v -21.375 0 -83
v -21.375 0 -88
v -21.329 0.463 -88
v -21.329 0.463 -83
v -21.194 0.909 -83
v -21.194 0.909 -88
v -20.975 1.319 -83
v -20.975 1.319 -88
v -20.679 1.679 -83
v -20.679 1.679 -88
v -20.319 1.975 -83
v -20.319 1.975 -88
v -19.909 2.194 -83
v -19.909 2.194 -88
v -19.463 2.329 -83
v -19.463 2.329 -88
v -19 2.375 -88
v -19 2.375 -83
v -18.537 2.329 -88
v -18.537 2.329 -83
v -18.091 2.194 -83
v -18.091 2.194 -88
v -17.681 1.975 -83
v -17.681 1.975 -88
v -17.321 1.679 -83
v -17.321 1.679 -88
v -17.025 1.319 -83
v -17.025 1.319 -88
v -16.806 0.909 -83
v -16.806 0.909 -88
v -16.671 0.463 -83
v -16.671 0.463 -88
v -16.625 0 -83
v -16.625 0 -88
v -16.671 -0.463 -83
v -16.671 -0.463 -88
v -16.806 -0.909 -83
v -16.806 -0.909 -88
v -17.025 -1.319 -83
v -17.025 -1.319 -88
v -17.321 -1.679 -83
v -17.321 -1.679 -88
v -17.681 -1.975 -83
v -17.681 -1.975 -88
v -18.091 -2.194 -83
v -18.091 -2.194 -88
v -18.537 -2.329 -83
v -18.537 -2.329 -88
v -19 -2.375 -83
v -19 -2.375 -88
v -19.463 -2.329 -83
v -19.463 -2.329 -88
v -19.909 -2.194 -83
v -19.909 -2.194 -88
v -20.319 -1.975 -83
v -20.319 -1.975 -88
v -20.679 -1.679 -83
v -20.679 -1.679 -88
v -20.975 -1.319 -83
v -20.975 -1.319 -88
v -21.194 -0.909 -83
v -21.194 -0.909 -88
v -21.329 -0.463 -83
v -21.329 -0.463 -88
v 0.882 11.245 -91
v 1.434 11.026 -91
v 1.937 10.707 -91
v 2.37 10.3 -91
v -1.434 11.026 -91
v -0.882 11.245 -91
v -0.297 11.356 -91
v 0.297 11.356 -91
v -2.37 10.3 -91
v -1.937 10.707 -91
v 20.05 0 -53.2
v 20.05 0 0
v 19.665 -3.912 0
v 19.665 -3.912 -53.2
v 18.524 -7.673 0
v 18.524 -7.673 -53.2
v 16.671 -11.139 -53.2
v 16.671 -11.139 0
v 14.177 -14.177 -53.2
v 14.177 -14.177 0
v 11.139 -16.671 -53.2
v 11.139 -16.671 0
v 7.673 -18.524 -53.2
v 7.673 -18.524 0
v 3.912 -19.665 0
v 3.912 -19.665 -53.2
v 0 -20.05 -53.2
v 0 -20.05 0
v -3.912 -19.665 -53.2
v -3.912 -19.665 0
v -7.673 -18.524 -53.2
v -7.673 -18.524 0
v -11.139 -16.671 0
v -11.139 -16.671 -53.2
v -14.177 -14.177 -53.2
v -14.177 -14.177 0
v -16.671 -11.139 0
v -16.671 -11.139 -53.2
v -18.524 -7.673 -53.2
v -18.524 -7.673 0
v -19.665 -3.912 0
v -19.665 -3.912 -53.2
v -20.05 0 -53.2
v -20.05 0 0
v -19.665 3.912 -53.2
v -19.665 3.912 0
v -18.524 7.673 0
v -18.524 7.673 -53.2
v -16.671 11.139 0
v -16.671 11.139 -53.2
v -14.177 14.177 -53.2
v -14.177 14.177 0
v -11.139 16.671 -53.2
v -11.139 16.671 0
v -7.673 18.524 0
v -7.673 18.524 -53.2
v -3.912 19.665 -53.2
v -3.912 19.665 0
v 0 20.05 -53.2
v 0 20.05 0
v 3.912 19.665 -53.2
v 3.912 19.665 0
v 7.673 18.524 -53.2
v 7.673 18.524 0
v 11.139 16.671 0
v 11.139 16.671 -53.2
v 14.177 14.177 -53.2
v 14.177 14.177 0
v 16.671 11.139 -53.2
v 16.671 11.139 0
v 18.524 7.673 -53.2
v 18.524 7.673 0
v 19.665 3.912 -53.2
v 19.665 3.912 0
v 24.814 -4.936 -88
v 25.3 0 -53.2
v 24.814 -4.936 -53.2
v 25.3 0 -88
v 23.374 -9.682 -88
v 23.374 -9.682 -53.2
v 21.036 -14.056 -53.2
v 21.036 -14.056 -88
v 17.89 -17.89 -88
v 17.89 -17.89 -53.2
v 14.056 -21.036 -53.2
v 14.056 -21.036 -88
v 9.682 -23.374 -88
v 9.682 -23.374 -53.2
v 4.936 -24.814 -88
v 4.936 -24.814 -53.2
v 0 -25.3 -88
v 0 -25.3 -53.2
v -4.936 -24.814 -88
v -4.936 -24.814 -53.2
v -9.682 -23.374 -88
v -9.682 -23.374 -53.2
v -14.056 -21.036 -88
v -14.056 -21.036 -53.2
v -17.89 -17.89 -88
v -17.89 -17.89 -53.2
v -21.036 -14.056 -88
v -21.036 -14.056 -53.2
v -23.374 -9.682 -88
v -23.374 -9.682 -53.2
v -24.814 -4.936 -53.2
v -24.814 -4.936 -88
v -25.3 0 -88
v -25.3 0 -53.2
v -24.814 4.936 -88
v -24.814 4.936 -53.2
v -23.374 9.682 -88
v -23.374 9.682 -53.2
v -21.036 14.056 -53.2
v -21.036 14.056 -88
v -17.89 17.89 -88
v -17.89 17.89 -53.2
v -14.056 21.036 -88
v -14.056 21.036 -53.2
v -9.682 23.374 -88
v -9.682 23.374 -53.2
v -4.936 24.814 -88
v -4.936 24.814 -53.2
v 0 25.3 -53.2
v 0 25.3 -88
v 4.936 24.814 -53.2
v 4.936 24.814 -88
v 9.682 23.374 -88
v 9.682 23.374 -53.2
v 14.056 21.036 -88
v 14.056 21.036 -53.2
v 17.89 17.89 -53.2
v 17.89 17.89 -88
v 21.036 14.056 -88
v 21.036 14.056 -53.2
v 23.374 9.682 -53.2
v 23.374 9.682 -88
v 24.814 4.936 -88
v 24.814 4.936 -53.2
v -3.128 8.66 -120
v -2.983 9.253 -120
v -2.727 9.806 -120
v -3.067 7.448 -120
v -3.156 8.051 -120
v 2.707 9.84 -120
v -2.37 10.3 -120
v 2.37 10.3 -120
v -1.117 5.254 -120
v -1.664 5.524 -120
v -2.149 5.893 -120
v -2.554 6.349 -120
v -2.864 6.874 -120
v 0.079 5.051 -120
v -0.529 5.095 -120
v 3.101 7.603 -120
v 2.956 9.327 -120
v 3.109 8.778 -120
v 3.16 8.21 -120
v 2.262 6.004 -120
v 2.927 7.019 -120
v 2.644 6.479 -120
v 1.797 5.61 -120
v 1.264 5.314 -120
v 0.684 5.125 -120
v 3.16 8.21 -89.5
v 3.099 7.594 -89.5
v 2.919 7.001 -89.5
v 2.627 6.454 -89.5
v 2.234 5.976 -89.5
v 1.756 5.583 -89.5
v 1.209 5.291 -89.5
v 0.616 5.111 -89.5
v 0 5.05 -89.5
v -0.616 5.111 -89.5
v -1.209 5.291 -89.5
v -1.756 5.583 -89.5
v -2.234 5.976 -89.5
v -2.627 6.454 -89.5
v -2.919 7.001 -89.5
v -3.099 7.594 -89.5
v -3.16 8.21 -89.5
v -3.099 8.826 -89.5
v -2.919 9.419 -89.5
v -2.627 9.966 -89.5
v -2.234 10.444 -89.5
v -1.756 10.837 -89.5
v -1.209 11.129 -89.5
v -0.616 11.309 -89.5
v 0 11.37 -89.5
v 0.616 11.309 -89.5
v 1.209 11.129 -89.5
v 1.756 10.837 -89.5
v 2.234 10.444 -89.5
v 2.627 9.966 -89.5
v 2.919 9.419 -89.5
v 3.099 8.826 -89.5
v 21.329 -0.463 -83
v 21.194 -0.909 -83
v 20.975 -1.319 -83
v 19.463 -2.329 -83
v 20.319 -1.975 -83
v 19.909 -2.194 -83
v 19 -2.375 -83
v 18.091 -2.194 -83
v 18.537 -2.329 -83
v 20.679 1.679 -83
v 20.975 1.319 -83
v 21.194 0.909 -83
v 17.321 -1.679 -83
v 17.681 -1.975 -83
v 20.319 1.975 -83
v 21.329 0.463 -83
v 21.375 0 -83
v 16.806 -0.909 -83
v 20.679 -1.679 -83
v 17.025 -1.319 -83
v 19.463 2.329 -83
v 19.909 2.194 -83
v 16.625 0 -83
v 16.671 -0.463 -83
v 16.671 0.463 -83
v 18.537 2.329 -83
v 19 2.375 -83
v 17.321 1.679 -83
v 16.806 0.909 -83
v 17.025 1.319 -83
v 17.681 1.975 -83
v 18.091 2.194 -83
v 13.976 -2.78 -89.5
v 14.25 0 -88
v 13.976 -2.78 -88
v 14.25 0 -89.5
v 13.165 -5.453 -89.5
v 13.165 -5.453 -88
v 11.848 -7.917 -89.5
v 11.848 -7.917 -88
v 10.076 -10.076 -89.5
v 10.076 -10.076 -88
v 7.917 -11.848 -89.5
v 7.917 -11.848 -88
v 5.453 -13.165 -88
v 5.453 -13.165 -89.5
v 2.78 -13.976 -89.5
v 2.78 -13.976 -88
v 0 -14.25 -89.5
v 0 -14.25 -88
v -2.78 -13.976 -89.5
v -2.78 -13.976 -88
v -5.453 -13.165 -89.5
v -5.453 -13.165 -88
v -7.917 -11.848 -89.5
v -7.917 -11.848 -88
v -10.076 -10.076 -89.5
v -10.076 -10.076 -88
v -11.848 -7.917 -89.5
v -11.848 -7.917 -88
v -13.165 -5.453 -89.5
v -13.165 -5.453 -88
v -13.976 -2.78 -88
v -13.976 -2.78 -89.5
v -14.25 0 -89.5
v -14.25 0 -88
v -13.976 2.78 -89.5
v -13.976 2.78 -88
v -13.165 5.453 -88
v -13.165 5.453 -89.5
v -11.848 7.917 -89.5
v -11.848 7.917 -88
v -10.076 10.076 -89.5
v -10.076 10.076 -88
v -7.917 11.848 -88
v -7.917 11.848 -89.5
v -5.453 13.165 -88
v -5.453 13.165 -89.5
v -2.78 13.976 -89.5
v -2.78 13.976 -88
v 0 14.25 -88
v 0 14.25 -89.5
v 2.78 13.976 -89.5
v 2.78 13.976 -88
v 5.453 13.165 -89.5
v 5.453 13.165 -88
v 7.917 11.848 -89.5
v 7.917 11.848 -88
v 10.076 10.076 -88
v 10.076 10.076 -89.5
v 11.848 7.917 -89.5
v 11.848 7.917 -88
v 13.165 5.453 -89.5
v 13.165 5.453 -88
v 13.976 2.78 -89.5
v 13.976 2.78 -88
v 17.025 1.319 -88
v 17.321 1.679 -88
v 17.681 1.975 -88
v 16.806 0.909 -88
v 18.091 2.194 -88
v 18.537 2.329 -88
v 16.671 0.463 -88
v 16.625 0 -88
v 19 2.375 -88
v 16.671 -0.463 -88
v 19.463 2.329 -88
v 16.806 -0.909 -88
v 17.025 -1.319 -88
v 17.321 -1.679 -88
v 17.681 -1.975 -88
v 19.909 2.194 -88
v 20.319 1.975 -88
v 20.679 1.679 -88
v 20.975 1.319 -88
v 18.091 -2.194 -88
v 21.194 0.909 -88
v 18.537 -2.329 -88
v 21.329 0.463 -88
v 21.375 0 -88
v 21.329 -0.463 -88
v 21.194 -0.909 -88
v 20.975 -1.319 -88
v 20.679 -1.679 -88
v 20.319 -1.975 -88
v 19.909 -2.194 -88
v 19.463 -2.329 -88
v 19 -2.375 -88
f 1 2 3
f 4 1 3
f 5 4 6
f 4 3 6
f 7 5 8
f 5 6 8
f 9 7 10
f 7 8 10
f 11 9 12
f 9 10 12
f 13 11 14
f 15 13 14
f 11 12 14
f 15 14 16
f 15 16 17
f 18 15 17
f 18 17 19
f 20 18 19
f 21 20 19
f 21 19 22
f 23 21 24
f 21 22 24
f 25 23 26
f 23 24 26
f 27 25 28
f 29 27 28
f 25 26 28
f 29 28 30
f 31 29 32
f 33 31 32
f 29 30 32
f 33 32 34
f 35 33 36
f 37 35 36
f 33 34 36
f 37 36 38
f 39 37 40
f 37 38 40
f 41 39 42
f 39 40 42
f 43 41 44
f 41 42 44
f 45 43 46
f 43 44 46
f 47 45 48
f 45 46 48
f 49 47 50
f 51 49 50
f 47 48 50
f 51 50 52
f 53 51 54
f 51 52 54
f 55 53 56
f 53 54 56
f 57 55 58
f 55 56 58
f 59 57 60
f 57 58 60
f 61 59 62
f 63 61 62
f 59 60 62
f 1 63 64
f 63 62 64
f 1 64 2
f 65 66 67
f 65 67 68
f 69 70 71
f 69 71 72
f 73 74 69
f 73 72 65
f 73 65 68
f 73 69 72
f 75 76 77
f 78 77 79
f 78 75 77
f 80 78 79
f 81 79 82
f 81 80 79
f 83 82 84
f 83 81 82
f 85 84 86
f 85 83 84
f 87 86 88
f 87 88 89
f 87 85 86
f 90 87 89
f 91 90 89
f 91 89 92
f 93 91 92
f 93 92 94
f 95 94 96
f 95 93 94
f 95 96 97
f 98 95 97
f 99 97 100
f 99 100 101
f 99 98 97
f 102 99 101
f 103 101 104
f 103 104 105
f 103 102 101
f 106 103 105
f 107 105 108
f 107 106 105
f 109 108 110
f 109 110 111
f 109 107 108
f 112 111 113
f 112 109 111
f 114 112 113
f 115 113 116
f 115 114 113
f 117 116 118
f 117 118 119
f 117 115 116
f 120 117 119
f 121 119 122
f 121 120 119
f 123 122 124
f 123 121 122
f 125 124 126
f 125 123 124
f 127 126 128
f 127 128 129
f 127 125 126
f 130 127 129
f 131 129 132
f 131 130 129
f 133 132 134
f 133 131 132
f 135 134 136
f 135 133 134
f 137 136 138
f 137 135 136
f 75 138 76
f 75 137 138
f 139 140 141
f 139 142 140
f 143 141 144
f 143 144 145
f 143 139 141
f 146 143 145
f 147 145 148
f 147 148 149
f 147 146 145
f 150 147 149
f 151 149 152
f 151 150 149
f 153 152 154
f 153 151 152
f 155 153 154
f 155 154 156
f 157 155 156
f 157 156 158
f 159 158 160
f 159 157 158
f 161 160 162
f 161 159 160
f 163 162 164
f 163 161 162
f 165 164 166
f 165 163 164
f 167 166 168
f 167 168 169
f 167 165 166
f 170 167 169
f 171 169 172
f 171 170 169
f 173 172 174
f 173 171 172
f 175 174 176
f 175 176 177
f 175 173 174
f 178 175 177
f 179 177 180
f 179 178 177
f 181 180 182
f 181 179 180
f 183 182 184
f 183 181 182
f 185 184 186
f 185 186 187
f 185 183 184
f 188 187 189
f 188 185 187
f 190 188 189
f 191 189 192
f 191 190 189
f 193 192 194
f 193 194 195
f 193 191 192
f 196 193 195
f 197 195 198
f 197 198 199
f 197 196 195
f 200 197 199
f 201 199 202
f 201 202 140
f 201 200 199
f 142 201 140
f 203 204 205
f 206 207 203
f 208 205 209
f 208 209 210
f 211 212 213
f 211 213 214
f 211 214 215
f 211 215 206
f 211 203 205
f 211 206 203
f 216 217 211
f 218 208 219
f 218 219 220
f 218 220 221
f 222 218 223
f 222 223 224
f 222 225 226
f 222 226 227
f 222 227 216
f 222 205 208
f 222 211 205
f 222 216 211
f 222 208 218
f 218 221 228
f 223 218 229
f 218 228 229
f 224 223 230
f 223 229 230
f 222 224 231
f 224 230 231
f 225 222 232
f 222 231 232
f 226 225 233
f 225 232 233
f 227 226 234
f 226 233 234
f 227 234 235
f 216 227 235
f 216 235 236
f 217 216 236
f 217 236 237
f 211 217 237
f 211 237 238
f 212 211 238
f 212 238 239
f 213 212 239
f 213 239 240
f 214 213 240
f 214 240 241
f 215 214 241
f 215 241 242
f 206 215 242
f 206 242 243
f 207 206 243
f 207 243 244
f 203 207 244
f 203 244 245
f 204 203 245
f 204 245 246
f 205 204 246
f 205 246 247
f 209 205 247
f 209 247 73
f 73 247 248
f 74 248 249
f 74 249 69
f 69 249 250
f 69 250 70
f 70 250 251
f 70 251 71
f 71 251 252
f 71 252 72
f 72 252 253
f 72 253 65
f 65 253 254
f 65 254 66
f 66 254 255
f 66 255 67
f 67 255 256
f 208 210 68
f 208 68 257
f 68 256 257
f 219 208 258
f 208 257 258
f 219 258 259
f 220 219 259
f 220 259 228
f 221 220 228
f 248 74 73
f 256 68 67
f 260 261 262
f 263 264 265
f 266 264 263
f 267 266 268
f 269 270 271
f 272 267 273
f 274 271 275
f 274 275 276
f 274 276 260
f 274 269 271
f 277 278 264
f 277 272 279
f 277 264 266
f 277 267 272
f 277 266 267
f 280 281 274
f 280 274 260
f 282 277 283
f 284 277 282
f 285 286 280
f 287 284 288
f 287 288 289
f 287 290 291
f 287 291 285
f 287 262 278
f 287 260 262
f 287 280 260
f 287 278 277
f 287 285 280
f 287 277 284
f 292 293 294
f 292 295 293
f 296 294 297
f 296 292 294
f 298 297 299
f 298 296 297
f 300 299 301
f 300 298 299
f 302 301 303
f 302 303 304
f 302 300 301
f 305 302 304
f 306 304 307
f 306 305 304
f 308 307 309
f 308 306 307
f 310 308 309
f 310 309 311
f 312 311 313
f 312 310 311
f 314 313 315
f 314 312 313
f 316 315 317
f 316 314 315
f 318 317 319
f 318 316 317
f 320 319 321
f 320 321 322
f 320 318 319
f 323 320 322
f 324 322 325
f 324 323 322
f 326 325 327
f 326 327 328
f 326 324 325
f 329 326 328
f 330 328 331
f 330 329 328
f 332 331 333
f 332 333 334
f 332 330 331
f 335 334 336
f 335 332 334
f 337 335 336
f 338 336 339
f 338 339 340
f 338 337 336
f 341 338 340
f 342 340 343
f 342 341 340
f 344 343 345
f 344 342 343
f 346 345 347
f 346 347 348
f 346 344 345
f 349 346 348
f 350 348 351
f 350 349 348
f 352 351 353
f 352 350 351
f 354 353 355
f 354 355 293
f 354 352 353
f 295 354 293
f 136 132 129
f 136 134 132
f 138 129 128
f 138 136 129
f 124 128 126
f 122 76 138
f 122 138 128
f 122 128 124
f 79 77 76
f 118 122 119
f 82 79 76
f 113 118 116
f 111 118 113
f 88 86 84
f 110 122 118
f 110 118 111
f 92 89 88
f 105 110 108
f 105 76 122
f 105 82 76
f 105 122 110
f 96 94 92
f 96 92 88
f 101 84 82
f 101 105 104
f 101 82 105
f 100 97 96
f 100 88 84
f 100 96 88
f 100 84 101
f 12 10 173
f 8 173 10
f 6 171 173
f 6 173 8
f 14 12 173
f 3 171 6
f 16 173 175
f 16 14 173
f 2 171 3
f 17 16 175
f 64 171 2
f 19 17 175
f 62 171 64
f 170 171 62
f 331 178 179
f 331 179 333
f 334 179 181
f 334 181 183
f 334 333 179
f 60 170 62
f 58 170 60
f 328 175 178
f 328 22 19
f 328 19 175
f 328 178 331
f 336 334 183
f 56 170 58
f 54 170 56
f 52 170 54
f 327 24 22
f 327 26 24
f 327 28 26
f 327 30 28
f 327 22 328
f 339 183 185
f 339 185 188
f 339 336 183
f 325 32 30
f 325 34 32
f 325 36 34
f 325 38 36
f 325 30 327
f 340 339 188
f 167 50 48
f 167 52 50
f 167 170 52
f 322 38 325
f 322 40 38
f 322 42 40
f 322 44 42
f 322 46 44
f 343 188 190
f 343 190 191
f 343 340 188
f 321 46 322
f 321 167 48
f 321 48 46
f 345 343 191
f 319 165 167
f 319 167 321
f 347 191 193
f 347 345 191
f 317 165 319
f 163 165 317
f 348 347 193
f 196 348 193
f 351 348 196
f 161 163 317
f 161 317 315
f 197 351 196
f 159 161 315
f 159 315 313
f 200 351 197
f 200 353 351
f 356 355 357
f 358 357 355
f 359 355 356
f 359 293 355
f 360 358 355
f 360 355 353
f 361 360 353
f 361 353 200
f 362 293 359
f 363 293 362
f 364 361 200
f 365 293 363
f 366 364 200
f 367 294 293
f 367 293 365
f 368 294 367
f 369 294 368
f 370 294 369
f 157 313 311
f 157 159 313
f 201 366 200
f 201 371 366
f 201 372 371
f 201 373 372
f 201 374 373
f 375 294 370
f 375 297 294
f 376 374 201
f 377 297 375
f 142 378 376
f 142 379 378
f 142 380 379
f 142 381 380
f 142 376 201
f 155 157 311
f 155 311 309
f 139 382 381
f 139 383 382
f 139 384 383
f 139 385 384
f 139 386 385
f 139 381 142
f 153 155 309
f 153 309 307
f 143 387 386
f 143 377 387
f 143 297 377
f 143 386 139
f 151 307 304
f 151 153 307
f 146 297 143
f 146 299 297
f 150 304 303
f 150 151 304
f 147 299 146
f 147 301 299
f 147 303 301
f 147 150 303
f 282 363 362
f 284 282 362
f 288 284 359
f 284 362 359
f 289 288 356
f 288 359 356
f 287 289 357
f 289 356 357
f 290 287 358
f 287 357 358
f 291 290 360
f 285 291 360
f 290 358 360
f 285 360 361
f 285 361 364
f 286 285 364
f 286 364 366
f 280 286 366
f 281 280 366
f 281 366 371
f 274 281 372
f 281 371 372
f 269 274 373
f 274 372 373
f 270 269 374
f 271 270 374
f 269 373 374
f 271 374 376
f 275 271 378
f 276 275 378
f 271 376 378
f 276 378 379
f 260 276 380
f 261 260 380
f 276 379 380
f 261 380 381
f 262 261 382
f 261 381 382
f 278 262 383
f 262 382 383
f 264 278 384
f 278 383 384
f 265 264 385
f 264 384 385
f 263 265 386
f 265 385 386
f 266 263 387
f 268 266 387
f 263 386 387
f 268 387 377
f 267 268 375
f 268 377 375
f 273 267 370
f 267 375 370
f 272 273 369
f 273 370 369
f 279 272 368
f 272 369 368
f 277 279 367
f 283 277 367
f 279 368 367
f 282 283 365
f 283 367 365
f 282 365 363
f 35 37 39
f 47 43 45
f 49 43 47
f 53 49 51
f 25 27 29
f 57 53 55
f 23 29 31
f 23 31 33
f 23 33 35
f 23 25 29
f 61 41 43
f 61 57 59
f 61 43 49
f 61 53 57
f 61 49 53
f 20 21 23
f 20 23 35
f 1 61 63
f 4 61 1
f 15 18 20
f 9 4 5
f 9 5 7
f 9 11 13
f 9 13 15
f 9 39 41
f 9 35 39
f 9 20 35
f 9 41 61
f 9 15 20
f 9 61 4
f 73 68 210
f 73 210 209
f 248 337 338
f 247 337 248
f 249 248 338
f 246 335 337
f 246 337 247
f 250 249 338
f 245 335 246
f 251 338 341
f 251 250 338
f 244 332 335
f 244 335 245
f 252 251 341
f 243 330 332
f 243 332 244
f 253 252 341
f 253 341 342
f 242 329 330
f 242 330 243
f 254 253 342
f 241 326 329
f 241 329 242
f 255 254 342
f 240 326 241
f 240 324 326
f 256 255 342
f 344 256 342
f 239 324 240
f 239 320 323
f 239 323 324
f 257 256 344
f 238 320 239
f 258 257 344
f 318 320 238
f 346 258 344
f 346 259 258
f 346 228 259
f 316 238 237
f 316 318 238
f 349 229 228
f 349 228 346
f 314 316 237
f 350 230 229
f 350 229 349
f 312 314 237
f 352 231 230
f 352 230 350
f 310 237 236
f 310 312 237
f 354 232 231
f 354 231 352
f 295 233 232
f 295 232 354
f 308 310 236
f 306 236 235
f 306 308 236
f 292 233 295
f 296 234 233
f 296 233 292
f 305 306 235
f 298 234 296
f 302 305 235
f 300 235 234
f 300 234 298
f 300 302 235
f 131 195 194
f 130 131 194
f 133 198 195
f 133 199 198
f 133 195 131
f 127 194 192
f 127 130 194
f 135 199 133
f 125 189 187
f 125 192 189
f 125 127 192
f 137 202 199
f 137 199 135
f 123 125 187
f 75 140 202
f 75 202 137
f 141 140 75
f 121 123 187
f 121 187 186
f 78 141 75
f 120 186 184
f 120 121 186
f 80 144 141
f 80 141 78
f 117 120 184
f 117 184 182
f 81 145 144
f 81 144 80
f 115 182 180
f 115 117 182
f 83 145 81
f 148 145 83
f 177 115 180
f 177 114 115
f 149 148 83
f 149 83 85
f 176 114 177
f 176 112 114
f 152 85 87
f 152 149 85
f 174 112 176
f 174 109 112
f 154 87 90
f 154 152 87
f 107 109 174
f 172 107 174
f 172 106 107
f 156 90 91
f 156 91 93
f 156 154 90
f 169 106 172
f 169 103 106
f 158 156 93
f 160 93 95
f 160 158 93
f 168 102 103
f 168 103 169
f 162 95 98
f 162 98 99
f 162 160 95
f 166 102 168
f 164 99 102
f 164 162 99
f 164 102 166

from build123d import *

# Parameters (mm, degrees)
SKETCH4_R           = 3.16
BOSS_EXTRUDE1_DEPTH = 30.5
CUT_EXTRUDE2_START  = -29
CUT_EXTRUDE2_DEPTH  = 29
SKETCH6_R           = 2.375
CUT_EXTRUDE3_DEPTH  = 5


with BuildPart() as part:
    # Sketch1 → Revolve1 (revolve)
    with BuildSketch(Plane(origin=(0, 0, 0), x_dir=(1, 0, 0), z_dir=(0, 1, 0))):
        Polygon((0, 0), (20.05, 0), (20.05, 53.2), (25.3, 53.2), (25.3, 88), (14.25, 88), (14.25, 89.5), (0, 89.5), align=None)
    revolve(axis=Axis((0, 0, 0), (0, 0, -1)))

    # Sketch4 → Boss-Extrude1 (add)
    with BuildSketch(Plane(origin=(0, 0, -89.5), x_dir=(-1, 0, 0), z_dir=(0, 0, -1))):
        with Locations(Location((0, 8.21, 0), (0, 0, 180))):
            Circle(SKETCH4_R)
    extrude(amount=BOSS_EXTRUDE1_DEPTH)

    # Sketch5 → Cut-Extrude2 (cut)
    with BuildSketch(Plane(origin=(0, 0, -120), x_dir=(-1, 0, 0), z_dir=(0, 0, -1)).offset(CUT_EXTRUDE2_START)):
        with BuildLine():
            Line((-2.370126579, 10.3), (2.370126579, 10.3))
            ThreePointArc((2.370126579, 10.3), (0, 11.37), (-2.370126579, 10.3))
        make_face()
    extrude(amount=CUT_EXTRUDE2_DEPTH, mode=Mode.SUBTRACT)

    # Sketch6 → Cut-Extrude3 (cut)
    with BuildSketch(Plane(origin=(0, 0, -88), x_dir=(-1, 0, 0), z_dir=(0, 0, -1))):
        with Locations((-19, 0)):
            Circle(SKETCH6_R)
        with Locations((19, 0)):
            Circle(SKETCH6_R)
    extrude(amount=-CUT_EXTRUDE3_DEPTH, mode=Mode.SUBTRACT)


solid = part.part
